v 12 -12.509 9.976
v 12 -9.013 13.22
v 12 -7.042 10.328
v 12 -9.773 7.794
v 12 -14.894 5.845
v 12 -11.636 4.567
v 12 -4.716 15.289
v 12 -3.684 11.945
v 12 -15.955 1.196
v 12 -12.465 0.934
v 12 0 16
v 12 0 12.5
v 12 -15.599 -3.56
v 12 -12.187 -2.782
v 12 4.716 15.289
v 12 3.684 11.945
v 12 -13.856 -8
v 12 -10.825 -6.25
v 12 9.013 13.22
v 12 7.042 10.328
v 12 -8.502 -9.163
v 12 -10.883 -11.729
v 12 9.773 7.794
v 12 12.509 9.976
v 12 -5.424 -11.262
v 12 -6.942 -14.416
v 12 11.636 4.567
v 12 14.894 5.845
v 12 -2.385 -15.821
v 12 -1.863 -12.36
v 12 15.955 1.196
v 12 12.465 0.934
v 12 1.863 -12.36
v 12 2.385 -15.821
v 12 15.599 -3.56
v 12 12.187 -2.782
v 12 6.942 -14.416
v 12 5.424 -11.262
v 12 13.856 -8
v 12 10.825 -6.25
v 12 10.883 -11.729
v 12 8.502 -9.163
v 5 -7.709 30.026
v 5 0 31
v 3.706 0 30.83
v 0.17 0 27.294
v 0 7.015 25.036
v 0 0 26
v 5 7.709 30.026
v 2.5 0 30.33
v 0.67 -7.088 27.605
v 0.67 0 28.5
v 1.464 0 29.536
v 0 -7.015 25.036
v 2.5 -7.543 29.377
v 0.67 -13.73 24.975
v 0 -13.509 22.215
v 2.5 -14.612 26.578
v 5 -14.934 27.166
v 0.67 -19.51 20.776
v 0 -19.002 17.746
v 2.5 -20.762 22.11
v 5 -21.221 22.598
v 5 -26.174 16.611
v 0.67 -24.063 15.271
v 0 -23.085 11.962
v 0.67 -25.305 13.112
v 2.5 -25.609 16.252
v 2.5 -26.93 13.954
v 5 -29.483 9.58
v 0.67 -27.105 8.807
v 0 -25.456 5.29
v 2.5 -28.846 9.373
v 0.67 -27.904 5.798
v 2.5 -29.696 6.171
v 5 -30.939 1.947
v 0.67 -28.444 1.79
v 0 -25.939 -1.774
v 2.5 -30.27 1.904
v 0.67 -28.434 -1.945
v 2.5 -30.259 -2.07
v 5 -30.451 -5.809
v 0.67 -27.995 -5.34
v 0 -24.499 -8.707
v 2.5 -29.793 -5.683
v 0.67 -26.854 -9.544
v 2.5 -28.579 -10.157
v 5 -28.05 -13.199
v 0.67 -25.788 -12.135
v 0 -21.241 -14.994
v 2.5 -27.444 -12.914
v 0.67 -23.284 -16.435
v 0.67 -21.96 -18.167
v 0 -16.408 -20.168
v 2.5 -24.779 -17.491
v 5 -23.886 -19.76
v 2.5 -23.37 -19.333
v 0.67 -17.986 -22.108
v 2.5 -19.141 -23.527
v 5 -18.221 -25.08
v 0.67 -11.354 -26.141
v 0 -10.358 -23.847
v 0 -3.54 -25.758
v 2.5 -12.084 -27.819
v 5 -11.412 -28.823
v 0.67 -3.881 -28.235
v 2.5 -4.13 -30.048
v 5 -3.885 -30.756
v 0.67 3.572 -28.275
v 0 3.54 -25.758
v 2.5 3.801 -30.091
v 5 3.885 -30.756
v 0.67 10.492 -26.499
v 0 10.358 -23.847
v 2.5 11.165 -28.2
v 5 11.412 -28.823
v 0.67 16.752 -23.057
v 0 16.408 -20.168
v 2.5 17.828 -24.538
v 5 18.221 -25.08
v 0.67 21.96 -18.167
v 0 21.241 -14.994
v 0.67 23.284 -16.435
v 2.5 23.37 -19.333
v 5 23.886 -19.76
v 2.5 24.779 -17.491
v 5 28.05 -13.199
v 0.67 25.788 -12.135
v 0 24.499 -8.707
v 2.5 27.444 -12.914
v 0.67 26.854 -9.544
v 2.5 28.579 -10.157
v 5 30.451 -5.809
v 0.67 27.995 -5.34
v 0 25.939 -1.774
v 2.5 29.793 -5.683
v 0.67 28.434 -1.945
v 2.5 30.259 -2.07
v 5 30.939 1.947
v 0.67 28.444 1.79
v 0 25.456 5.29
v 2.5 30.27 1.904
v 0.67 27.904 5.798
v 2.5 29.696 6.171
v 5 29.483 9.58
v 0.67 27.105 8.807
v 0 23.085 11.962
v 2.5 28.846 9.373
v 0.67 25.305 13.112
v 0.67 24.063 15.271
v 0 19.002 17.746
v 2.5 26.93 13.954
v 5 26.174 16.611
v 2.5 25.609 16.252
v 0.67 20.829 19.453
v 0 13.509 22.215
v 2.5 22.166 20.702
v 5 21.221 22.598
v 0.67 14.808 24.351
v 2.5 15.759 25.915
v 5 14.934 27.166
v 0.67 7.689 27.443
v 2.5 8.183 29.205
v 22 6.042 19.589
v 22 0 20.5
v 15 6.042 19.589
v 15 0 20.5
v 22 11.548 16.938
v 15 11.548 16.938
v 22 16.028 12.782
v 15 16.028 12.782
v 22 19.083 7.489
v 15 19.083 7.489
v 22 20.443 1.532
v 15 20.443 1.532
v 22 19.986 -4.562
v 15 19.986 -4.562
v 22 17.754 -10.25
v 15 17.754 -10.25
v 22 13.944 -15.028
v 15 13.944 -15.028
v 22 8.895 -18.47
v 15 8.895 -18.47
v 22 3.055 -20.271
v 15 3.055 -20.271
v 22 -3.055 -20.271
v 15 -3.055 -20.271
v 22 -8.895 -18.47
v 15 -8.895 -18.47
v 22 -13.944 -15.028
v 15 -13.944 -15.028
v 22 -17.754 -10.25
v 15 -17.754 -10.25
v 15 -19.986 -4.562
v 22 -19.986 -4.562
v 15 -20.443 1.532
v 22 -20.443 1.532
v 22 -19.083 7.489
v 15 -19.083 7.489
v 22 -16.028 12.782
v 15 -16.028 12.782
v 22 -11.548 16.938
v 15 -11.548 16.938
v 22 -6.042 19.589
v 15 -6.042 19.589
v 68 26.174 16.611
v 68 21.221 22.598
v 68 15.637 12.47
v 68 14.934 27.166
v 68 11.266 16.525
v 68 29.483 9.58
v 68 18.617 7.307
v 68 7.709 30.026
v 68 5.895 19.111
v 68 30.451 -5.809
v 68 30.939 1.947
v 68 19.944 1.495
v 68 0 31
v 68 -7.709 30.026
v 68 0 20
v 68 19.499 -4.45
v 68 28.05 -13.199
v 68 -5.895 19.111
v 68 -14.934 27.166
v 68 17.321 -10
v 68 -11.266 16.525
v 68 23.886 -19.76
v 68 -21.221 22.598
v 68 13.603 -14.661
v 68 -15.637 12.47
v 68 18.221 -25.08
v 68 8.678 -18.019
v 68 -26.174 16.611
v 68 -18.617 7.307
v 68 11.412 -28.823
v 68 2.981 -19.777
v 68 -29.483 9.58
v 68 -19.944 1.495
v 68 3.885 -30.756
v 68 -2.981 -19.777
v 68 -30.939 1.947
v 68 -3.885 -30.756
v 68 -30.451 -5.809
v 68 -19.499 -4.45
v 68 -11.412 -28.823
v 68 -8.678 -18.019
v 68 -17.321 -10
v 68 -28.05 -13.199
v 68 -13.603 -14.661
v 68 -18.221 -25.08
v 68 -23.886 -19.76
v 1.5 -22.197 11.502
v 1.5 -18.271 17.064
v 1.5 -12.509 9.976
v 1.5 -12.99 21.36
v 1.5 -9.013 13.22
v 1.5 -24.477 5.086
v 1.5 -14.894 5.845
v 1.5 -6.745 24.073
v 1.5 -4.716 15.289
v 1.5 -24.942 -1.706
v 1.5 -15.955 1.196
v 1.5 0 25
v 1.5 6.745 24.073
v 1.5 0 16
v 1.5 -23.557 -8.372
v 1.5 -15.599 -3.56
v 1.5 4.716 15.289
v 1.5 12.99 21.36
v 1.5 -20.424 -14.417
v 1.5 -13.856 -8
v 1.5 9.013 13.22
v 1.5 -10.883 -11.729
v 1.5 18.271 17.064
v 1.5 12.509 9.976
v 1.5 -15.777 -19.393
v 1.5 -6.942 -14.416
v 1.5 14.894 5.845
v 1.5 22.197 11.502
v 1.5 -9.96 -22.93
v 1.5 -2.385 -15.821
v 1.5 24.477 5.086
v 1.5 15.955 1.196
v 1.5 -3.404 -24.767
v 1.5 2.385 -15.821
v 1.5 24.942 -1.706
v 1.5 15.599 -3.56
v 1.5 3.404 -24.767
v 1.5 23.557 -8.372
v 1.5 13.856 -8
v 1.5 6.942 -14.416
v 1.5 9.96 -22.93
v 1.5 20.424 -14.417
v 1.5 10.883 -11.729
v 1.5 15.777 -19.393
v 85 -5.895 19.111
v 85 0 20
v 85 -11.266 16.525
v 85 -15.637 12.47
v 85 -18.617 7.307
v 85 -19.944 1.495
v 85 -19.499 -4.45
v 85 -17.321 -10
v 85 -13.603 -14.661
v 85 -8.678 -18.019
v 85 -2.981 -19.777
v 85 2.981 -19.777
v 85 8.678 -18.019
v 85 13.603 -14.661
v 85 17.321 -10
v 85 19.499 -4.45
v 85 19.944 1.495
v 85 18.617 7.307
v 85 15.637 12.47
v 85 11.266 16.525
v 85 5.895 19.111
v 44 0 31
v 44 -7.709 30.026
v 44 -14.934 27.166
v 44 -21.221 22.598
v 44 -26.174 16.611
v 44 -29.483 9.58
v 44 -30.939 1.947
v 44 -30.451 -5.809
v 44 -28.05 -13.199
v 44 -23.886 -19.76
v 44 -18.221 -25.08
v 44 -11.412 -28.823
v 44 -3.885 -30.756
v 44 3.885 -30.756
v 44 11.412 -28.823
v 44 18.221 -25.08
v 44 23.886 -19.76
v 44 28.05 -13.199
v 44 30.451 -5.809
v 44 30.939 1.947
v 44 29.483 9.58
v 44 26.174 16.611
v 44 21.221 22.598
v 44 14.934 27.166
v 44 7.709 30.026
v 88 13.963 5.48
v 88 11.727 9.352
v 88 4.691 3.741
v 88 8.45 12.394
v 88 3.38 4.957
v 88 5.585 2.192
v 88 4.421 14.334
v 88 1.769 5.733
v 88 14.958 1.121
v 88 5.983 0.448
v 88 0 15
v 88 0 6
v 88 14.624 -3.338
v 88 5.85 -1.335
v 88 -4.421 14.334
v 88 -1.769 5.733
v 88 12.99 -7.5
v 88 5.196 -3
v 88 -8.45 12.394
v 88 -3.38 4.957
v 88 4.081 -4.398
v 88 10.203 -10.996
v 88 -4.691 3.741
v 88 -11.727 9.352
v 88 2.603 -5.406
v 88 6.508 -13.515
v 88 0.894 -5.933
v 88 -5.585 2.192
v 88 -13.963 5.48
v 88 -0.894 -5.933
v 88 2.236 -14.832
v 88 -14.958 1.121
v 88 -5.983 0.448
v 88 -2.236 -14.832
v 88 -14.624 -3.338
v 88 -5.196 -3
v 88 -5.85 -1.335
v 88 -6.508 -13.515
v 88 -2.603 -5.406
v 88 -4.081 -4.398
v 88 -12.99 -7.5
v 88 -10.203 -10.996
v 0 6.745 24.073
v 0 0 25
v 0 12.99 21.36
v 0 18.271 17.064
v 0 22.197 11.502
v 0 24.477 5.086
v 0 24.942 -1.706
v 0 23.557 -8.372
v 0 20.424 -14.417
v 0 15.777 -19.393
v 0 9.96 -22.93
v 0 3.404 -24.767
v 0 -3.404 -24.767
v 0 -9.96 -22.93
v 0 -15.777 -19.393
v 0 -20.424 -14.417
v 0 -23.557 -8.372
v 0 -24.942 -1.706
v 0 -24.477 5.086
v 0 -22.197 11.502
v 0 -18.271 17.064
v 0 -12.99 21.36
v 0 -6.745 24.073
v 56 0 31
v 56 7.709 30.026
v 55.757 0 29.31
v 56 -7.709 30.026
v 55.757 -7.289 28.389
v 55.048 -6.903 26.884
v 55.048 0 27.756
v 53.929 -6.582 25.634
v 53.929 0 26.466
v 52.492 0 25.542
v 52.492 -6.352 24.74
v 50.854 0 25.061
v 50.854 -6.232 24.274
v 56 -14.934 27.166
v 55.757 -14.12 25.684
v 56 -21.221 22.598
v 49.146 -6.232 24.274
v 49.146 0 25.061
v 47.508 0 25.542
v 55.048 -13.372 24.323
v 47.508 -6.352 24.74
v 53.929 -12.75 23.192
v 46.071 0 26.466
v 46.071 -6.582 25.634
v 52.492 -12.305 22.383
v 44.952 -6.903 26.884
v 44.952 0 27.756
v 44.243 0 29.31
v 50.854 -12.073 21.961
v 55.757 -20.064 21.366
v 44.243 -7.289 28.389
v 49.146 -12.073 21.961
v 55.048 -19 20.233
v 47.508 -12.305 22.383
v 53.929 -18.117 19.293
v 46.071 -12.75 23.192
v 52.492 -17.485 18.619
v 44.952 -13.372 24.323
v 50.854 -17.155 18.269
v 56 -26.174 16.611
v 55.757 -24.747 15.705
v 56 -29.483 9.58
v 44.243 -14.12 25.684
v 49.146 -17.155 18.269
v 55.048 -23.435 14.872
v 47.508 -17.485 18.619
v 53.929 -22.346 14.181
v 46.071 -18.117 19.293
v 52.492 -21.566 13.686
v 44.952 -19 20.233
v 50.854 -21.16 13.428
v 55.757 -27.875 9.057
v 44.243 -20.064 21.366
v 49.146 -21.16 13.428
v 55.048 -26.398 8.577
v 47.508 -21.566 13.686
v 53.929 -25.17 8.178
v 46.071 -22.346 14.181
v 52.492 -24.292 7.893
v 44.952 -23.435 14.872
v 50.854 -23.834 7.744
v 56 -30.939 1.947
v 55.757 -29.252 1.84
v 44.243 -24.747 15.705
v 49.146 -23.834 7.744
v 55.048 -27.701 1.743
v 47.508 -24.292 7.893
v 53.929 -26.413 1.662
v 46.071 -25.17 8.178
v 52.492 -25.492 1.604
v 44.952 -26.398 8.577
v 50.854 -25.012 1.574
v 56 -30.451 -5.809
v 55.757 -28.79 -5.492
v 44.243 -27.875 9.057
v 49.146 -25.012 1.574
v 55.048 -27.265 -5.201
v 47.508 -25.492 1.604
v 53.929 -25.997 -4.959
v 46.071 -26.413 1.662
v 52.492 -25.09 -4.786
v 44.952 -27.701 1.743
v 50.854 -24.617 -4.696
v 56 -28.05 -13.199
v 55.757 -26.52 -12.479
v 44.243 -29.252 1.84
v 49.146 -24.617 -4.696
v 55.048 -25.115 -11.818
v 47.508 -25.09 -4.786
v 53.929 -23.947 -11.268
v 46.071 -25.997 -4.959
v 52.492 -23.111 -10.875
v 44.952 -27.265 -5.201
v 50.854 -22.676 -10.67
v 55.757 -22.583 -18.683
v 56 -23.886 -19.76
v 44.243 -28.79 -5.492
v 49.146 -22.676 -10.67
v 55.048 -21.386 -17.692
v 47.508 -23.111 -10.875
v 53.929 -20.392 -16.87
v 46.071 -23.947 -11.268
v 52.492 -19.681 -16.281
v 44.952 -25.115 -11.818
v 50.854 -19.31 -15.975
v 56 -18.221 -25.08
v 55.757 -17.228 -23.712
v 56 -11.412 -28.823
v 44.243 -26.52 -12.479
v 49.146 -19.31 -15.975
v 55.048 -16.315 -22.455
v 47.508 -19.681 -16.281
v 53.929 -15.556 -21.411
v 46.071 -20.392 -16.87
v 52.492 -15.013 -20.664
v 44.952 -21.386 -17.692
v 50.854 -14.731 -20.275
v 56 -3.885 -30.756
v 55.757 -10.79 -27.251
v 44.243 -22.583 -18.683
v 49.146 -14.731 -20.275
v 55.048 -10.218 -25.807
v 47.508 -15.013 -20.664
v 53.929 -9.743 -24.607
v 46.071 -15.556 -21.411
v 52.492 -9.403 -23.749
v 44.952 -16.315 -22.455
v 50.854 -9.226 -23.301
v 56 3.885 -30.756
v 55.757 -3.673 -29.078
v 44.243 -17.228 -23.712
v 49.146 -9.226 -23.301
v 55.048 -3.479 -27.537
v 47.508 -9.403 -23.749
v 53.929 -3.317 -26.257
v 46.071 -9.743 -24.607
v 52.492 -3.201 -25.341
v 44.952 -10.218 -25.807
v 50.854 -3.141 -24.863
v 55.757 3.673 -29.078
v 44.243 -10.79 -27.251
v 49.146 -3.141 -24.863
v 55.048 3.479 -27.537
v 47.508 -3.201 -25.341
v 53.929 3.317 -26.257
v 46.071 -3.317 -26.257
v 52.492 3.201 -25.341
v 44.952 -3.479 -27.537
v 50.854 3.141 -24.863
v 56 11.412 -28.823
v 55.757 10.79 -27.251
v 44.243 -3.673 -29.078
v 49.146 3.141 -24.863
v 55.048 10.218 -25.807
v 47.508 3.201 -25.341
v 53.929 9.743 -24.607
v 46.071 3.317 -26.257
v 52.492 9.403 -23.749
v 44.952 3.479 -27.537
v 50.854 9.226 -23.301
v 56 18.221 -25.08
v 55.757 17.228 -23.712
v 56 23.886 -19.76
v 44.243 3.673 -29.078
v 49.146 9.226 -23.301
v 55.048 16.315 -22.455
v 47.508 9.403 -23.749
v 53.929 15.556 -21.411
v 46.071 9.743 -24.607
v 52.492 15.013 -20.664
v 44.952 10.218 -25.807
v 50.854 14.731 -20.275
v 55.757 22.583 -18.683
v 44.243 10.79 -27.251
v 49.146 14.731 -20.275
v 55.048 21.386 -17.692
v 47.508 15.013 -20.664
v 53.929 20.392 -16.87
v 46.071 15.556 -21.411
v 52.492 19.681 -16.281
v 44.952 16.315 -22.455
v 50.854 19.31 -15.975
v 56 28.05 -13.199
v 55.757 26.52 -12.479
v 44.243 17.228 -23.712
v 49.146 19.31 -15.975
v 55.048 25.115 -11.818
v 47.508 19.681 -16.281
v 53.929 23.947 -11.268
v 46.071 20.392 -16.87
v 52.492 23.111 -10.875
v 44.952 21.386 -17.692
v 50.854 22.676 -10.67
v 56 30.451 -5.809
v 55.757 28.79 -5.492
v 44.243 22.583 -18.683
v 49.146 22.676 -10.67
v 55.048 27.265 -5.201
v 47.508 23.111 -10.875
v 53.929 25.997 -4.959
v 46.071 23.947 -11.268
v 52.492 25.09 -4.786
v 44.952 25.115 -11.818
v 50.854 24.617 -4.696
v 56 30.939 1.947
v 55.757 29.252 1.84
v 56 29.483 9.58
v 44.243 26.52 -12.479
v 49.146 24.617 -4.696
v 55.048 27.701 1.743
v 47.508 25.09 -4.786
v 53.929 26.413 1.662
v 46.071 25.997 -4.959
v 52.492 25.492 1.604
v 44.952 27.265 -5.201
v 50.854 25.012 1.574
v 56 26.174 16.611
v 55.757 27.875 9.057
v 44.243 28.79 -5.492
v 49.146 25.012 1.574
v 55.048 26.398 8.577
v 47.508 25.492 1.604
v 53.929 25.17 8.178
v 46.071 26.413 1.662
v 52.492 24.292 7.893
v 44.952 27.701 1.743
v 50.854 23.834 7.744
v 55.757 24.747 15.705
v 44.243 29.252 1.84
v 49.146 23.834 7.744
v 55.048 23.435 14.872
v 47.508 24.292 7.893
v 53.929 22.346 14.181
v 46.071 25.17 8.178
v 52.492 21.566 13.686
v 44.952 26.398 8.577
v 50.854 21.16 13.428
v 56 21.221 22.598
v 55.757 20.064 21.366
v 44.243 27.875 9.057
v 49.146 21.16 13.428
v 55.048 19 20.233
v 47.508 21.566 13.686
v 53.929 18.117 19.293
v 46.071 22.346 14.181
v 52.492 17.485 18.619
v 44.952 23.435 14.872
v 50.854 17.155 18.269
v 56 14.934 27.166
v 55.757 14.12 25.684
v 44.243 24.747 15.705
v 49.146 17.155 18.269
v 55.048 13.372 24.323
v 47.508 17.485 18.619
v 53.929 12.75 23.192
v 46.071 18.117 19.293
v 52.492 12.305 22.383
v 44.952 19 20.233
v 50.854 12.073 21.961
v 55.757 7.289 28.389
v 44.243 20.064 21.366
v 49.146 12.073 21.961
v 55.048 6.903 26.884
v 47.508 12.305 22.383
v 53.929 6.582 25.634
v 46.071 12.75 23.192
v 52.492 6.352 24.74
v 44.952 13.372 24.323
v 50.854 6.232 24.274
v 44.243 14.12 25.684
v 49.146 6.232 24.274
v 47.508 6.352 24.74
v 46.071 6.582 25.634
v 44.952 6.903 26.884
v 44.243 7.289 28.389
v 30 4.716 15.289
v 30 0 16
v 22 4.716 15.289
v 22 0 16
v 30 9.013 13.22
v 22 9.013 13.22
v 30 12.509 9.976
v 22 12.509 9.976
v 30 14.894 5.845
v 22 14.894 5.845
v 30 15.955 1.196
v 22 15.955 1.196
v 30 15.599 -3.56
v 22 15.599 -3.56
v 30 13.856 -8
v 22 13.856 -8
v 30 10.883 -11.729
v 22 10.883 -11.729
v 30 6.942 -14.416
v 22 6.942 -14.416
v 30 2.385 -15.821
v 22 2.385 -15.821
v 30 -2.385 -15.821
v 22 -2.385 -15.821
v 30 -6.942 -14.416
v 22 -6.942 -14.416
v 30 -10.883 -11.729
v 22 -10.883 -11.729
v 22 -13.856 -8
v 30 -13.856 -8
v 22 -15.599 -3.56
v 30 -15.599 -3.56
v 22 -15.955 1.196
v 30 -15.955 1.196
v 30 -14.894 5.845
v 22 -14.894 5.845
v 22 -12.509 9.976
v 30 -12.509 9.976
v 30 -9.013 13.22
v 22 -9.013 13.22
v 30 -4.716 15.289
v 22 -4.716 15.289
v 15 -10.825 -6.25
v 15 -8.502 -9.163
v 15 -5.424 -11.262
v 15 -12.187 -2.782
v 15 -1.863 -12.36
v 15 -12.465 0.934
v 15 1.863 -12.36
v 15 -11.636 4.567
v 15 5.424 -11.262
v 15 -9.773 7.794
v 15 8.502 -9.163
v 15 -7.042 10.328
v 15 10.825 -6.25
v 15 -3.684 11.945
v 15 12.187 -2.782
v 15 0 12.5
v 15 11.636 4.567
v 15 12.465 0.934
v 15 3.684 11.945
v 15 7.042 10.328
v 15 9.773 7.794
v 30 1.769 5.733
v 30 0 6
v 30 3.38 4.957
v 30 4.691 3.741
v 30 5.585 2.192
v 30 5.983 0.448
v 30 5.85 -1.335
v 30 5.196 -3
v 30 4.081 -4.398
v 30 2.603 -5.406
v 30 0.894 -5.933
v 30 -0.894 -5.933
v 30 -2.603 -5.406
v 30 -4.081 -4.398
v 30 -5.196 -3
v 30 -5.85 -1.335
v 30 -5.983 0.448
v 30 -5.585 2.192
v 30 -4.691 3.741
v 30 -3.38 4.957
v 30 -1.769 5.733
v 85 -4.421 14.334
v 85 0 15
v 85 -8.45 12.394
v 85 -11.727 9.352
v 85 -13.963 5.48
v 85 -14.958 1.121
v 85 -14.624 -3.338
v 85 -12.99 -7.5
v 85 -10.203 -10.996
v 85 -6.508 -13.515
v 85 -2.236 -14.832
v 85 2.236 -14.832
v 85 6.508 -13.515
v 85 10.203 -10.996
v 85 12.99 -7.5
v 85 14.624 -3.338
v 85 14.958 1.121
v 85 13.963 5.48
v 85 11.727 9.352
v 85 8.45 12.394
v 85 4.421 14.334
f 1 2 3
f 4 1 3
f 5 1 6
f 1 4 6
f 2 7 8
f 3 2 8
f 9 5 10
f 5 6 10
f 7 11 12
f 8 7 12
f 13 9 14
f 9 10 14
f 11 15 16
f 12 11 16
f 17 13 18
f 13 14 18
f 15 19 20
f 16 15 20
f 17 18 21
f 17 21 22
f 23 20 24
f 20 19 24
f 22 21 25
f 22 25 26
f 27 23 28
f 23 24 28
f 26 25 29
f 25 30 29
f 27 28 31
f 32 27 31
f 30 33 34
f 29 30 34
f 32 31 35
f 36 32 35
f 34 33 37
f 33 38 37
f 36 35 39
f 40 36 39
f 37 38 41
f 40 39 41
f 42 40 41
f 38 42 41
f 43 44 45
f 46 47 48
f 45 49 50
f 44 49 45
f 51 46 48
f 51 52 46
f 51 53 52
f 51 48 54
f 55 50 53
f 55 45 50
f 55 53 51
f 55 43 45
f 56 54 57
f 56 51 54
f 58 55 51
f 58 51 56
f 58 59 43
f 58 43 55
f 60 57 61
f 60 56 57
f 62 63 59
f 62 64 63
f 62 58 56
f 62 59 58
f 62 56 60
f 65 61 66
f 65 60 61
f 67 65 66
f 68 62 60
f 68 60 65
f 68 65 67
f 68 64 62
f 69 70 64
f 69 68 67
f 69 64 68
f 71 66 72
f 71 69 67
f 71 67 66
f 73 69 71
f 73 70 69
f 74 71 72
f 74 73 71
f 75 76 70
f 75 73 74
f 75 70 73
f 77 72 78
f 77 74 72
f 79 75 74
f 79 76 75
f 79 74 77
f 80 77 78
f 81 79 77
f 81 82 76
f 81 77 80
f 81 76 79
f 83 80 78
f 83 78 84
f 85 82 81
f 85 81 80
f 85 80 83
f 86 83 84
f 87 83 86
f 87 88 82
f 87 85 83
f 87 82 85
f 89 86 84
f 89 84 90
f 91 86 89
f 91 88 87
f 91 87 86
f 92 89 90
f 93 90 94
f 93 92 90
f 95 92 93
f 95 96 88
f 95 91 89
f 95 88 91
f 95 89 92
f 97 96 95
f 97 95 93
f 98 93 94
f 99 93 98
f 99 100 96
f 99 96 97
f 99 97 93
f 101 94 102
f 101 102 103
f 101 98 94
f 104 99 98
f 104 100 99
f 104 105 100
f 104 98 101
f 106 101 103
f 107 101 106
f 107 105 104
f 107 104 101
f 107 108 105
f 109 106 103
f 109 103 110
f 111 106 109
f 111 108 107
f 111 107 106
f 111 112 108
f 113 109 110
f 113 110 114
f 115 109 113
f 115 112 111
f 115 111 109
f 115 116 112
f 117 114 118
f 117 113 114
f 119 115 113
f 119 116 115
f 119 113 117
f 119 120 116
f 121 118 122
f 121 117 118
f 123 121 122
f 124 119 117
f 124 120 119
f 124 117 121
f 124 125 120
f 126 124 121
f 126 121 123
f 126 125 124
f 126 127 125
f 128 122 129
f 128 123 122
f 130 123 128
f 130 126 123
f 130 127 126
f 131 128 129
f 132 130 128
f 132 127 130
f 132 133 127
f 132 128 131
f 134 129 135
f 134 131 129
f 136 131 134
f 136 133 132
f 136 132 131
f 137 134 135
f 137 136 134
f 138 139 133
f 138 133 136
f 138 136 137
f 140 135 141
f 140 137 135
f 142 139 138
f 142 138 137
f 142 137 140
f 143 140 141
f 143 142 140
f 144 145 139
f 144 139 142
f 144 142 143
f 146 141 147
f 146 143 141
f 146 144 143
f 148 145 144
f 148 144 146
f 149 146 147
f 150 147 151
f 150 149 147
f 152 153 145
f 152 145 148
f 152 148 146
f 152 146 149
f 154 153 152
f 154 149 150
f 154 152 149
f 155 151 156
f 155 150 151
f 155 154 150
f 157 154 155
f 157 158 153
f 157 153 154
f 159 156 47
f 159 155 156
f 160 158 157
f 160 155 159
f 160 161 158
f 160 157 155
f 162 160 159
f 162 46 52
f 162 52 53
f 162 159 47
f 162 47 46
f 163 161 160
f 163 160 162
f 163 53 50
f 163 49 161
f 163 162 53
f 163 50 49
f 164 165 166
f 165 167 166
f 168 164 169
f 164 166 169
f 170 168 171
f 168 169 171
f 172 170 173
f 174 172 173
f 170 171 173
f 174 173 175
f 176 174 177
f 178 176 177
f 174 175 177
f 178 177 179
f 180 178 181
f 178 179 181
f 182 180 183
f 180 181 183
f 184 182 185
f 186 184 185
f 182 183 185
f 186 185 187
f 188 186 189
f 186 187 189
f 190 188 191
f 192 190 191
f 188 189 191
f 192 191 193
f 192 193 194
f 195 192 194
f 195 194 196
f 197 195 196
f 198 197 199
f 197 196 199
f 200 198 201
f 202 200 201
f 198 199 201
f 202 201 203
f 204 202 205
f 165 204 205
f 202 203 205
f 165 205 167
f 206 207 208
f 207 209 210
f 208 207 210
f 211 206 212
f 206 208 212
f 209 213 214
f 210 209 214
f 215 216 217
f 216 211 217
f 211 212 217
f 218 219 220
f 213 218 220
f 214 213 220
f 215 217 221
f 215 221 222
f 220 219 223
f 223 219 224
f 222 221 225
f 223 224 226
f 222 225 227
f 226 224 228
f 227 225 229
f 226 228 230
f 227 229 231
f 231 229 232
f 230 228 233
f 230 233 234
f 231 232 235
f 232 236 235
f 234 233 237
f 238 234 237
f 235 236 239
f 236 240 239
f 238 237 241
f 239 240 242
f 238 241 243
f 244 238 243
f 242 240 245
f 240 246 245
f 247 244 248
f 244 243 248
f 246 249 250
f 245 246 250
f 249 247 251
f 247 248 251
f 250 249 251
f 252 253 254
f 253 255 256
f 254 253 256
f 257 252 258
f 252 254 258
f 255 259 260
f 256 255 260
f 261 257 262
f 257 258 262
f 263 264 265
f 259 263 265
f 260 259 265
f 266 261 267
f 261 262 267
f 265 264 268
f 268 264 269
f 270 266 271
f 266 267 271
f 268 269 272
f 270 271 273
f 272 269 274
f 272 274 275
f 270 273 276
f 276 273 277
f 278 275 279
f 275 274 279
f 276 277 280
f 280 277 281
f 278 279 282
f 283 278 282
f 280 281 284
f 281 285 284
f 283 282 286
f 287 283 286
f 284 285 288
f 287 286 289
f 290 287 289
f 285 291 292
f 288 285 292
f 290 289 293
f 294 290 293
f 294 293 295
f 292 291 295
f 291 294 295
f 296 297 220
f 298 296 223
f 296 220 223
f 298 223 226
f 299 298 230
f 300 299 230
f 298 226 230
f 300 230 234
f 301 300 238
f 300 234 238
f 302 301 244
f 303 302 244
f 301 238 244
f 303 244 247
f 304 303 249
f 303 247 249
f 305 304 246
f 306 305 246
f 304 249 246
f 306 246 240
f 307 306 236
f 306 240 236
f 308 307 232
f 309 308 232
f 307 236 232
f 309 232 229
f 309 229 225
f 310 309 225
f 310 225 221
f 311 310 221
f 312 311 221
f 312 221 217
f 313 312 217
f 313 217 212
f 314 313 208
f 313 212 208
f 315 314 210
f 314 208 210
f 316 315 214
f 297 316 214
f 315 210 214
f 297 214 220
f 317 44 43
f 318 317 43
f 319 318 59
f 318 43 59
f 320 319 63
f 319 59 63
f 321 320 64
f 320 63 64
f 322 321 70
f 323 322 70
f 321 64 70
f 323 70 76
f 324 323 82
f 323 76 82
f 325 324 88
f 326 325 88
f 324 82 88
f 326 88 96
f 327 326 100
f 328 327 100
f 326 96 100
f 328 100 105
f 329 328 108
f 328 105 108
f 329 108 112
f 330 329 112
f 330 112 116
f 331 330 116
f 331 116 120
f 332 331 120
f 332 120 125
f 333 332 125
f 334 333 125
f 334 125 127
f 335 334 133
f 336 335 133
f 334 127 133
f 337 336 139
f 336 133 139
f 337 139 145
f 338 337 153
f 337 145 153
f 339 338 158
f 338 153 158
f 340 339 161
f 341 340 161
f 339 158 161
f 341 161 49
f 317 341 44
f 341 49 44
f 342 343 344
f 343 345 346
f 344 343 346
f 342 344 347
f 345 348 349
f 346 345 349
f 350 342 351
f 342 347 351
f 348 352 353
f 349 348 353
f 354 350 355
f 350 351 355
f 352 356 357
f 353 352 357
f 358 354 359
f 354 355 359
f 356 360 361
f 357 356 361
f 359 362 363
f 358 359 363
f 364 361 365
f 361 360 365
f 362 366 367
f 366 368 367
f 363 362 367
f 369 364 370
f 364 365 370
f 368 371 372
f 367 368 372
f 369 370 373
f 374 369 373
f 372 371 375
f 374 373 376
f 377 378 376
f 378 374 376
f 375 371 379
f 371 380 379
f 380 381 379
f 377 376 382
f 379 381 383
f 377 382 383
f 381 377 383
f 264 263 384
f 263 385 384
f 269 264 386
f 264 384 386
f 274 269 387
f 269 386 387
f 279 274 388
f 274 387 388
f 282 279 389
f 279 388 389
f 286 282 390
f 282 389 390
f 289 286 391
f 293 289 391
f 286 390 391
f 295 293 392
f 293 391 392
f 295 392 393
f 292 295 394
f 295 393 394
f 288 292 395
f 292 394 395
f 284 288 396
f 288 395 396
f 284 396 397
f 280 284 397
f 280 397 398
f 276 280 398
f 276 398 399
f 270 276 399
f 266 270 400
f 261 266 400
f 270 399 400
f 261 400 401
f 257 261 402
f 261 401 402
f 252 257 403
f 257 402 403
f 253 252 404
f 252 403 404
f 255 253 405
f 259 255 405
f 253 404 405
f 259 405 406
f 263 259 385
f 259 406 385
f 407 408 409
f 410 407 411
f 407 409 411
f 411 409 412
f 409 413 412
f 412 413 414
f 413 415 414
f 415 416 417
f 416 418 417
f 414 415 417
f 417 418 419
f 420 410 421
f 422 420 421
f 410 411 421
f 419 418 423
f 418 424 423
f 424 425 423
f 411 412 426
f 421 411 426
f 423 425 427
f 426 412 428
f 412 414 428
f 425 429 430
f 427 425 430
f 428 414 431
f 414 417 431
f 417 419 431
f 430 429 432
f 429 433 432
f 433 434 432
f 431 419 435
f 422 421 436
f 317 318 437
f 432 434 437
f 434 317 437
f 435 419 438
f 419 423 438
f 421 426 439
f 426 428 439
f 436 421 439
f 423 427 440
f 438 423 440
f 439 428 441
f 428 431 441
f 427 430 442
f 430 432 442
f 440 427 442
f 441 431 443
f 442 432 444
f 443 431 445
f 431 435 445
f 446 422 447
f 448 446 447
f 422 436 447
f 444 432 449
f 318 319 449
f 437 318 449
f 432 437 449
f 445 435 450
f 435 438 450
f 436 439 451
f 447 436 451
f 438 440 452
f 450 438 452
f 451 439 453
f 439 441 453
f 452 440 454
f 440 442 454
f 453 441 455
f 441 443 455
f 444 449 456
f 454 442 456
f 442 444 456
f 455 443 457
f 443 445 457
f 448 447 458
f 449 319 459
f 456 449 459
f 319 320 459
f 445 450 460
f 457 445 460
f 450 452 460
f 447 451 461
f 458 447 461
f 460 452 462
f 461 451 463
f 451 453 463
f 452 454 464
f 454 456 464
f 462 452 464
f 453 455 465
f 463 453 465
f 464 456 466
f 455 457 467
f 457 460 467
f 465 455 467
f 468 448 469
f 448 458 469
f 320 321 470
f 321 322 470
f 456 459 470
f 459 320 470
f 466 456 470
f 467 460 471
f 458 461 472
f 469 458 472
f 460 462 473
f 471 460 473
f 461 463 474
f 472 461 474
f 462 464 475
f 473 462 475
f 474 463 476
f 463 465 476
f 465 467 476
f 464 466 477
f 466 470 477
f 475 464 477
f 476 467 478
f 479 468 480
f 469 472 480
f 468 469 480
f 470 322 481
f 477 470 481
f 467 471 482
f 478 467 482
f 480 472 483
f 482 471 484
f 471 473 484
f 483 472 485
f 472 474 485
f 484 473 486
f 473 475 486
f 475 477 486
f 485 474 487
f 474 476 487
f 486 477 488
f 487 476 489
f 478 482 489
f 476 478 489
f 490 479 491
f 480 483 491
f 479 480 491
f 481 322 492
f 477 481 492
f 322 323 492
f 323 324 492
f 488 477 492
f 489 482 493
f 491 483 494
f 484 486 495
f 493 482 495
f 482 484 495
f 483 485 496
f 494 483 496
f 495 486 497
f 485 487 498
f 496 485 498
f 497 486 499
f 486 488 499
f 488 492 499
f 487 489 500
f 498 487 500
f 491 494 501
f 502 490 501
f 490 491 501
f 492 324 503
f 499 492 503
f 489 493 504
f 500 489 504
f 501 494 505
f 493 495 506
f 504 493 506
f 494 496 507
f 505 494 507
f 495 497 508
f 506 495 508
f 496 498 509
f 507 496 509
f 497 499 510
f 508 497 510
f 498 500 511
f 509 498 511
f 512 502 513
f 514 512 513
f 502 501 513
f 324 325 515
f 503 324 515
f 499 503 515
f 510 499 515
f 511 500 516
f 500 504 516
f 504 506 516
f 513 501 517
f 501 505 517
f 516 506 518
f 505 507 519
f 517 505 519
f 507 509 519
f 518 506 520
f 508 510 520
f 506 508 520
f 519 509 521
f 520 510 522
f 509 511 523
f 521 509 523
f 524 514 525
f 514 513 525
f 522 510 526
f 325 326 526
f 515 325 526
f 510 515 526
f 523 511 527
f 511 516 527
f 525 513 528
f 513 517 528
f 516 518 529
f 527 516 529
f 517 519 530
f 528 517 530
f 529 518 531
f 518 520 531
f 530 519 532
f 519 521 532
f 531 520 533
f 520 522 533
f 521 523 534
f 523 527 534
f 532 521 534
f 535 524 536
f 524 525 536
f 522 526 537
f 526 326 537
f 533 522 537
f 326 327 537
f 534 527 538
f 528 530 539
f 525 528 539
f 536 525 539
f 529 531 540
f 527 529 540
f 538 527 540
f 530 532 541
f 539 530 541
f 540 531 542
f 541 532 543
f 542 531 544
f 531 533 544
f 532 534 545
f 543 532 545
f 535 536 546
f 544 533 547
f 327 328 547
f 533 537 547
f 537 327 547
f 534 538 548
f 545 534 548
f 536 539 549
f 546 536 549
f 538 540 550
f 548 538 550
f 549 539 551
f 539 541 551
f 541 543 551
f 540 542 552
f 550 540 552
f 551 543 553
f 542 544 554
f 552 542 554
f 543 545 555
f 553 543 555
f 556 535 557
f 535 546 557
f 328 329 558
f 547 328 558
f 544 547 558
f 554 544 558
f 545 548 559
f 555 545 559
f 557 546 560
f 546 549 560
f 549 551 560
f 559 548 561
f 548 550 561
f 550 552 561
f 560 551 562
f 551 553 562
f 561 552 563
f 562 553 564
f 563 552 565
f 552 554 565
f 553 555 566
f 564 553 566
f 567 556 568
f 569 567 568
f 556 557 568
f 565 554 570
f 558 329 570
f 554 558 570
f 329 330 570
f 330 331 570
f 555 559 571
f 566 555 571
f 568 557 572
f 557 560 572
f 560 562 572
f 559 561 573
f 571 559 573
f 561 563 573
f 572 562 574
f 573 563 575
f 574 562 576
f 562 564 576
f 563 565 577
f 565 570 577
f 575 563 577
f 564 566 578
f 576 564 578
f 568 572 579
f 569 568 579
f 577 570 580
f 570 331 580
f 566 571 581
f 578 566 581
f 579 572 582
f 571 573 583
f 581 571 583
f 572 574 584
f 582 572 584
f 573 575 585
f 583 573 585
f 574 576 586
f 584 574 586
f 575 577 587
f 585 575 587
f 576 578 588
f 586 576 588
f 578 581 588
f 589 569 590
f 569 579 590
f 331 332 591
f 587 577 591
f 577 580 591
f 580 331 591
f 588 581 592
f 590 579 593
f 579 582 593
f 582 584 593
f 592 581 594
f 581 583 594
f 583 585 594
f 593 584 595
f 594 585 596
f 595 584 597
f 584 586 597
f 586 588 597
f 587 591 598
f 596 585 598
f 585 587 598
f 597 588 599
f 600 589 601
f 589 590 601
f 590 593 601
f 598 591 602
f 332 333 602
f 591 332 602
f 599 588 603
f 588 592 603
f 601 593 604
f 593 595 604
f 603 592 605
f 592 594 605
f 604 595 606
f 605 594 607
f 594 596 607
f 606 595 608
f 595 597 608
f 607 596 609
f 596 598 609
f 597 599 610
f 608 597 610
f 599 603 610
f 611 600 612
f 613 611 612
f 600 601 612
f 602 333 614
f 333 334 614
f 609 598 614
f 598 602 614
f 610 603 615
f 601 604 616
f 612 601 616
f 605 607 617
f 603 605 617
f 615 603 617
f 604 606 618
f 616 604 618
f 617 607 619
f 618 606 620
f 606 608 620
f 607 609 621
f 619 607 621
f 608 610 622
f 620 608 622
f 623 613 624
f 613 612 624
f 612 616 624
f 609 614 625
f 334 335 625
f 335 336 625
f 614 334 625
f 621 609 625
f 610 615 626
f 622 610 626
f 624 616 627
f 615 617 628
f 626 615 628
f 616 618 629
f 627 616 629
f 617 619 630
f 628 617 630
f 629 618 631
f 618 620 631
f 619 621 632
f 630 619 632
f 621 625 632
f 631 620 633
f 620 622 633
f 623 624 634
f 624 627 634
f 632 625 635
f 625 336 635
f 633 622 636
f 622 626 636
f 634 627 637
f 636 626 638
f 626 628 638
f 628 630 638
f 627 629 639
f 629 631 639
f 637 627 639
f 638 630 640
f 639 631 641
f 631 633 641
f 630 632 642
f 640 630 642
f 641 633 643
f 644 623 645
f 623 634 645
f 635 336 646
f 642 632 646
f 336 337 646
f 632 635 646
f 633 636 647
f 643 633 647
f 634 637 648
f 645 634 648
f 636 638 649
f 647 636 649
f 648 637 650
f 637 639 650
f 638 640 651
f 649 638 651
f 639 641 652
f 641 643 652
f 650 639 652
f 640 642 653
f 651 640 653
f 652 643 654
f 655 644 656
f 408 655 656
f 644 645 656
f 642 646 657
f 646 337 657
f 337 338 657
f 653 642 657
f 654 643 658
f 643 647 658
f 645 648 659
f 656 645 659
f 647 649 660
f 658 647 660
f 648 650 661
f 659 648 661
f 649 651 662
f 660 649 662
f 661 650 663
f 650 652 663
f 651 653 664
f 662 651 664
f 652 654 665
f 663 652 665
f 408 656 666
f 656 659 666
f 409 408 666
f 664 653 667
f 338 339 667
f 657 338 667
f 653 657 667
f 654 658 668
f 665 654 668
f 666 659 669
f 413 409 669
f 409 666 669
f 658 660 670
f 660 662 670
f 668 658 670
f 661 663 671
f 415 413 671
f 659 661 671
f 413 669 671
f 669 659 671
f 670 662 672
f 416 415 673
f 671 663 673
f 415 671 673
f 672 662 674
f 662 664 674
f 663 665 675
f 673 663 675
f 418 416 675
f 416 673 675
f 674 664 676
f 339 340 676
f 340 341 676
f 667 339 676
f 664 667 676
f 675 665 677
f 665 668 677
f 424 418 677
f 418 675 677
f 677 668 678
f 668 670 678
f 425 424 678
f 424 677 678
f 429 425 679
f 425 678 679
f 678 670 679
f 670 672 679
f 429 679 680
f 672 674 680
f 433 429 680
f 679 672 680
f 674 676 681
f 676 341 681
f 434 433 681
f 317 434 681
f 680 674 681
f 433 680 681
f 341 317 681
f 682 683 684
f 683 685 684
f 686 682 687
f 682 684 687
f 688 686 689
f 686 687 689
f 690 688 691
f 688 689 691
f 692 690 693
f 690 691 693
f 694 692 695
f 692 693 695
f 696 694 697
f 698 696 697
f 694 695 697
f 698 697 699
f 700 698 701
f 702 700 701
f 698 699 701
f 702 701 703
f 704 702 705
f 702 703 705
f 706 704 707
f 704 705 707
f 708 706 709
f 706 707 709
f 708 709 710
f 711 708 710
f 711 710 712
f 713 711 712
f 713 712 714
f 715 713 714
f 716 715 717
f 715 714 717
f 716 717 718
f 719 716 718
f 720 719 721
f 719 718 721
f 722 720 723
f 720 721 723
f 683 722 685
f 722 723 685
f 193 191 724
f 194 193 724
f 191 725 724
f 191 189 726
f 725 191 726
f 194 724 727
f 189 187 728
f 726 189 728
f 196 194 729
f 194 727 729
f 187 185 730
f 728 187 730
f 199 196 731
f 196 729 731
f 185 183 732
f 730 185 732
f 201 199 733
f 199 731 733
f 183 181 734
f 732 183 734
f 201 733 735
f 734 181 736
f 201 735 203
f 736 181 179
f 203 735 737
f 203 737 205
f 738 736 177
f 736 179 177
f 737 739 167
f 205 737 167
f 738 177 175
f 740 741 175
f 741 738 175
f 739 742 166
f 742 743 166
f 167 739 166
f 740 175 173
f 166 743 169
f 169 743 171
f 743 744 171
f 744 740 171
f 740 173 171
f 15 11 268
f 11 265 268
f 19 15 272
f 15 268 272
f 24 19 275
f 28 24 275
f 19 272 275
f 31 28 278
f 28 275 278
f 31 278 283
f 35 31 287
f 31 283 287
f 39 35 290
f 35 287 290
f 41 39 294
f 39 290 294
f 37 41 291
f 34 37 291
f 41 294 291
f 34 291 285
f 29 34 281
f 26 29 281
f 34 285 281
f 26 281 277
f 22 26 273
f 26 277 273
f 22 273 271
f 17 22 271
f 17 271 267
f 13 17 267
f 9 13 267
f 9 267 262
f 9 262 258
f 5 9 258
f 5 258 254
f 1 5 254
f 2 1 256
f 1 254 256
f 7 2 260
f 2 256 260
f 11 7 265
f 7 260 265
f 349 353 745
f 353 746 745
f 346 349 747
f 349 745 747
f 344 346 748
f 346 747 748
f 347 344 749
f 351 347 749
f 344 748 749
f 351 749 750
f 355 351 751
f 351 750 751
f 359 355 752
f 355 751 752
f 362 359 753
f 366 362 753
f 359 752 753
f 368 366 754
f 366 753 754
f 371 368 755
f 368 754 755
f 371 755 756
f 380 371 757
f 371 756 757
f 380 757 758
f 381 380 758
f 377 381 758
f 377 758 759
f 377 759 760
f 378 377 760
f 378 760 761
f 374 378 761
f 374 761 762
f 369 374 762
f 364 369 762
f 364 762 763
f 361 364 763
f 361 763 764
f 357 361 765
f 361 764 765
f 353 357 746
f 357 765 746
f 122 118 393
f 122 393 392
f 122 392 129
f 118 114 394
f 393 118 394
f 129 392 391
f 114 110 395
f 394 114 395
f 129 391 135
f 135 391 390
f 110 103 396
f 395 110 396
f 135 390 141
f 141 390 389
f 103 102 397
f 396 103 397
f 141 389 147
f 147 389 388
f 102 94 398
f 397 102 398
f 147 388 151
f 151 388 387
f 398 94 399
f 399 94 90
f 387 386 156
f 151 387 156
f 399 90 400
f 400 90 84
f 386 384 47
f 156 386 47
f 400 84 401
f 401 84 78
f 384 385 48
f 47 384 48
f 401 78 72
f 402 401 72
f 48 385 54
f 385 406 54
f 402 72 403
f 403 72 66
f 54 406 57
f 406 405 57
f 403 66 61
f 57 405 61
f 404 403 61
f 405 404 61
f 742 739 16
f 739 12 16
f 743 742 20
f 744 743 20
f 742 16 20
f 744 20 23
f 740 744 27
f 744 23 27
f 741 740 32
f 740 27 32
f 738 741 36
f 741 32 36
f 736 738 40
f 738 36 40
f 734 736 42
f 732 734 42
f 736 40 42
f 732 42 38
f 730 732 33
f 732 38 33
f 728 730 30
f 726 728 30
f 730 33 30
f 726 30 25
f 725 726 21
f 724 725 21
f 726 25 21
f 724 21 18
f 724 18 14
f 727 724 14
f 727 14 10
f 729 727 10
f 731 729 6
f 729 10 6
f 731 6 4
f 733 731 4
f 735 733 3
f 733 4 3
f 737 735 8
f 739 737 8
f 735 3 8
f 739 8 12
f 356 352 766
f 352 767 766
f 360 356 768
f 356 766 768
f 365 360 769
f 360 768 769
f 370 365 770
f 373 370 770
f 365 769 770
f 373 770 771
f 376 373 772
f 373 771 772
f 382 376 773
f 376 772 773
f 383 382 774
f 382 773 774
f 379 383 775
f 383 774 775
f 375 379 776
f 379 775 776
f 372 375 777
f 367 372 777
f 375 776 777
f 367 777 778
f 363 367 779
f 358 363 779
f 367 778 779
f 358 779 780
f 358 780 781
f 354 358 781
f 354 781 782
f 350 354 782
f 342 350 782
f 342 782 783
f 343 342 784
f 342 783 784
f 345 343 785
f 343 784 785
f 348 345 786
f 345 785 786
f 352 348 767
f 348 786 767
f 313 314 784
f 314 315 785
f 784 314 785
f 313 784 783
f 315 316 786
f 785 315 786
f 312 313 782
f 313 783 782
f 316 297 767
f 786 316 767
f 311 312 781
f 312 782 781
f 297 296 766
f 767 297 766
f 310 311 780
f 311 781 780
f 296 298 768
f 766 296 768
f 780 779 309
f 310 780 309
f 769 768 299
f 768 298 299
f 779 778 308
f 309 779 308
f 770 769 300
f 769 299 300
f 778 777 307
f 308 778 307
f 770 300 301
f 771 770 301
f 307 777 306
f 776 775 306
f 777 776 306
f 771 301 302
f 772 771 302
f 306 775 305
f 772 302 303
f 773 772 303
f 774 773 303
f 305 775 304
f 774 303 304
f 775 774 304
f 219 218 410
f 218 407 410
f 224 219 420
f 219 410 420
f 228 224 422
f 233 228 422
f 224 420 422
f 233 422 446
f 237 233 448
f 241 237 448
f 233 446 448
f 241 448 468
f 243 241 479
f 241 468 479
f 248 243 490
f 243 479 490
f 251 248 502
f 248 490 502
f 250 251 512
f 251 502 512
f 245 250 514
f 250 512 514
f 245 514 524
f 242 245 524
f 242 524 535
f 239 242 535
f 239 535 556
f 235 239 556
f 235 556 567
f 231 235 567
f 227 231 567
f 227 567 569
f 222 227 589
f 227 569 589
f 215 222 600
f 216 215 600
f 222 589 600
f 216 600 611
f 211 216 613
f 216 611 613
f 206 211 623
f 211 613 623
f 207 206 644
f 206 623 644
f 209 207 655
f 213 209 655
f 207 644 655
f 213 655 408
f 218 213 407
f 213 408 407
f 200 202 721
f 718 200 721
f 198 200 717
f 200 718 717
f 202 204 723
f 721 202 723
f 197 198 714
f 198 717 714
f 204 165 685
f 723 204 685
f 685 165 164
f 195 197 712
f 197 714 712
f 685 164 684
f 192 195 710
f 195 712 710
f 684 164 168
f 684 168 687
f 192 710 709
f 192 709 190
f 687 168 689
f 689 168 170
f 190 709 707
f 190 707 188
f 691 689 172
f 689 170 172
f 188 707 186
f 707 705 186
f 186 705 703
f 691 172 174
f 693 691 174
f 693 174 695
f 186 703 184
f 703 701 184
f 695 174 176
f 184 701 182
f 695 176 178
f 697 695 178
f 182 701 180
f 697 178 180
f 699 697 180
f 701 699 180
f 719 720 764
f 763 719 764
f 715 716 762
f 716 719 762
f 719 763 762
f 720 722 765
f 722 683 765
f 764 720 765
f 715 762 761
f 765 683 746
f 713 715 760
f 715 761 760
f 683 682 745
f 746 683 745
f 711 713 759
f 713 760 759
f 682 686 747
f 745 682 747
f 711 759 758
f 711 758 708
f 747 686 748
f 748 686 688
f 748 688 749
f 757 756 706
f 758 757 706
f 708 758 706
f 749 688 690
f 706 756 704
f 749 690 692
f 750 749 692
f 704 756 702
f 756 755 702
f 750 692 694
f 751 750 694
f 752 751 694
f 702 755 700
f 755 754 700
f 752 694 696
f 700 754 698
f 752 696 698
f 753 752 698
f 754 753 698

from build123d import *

# Parameters (mm, degrees)
F4_R = 5


with BuildPart() as f2:
    # F0 (on Front) → F2 (revolve)
    with BuildSketch(Plane.XZ):
        with BuildLine():
            Line((0, 31), (0, 0))
            Line((0, 0), (88, 0))
            Line((88, 0), (88, 15))
            Line((88, 15), (85, 15))
            Line((85, 15), (85, 20))
            Line((85, 20), (68, 20))
            Line((68, 20), (68, 31))
            Line((68, 31), (56, 31))
            ThreePointArc((56, 31), (50, 25), (44, 31))
            Line((44, 31), (0, 31))
        make_face()
    revolve(axis=Axis((63.740881, 0, 0), (1, 0, 0)))

    # F1 (on Front) → F3 (revolve, cut)
    with BuildSketch(Plane.XZ):
        Polygon((1.5, 25), (0, 25), (0, 0), (88, 0), (88, 6), (30, 6), (30, 16), (22, 16), (22, 20.5), (15, 20.5), (15, 12.5), (12, 12.5), (12, 16), (1.5, 16), align=None)
    revolve(axis=Axis((-14.931626, 0, 0), (-1, 0, 0)), mode=Mode.SUBTRACT)

    # F4
    f4_edges = [f2.edges().sort_by_distance(p)[0] for p in [
        (0, 0, -31),
    ]]
    fillet(f4_edges, radius=F4_R)


solid = f2.part
